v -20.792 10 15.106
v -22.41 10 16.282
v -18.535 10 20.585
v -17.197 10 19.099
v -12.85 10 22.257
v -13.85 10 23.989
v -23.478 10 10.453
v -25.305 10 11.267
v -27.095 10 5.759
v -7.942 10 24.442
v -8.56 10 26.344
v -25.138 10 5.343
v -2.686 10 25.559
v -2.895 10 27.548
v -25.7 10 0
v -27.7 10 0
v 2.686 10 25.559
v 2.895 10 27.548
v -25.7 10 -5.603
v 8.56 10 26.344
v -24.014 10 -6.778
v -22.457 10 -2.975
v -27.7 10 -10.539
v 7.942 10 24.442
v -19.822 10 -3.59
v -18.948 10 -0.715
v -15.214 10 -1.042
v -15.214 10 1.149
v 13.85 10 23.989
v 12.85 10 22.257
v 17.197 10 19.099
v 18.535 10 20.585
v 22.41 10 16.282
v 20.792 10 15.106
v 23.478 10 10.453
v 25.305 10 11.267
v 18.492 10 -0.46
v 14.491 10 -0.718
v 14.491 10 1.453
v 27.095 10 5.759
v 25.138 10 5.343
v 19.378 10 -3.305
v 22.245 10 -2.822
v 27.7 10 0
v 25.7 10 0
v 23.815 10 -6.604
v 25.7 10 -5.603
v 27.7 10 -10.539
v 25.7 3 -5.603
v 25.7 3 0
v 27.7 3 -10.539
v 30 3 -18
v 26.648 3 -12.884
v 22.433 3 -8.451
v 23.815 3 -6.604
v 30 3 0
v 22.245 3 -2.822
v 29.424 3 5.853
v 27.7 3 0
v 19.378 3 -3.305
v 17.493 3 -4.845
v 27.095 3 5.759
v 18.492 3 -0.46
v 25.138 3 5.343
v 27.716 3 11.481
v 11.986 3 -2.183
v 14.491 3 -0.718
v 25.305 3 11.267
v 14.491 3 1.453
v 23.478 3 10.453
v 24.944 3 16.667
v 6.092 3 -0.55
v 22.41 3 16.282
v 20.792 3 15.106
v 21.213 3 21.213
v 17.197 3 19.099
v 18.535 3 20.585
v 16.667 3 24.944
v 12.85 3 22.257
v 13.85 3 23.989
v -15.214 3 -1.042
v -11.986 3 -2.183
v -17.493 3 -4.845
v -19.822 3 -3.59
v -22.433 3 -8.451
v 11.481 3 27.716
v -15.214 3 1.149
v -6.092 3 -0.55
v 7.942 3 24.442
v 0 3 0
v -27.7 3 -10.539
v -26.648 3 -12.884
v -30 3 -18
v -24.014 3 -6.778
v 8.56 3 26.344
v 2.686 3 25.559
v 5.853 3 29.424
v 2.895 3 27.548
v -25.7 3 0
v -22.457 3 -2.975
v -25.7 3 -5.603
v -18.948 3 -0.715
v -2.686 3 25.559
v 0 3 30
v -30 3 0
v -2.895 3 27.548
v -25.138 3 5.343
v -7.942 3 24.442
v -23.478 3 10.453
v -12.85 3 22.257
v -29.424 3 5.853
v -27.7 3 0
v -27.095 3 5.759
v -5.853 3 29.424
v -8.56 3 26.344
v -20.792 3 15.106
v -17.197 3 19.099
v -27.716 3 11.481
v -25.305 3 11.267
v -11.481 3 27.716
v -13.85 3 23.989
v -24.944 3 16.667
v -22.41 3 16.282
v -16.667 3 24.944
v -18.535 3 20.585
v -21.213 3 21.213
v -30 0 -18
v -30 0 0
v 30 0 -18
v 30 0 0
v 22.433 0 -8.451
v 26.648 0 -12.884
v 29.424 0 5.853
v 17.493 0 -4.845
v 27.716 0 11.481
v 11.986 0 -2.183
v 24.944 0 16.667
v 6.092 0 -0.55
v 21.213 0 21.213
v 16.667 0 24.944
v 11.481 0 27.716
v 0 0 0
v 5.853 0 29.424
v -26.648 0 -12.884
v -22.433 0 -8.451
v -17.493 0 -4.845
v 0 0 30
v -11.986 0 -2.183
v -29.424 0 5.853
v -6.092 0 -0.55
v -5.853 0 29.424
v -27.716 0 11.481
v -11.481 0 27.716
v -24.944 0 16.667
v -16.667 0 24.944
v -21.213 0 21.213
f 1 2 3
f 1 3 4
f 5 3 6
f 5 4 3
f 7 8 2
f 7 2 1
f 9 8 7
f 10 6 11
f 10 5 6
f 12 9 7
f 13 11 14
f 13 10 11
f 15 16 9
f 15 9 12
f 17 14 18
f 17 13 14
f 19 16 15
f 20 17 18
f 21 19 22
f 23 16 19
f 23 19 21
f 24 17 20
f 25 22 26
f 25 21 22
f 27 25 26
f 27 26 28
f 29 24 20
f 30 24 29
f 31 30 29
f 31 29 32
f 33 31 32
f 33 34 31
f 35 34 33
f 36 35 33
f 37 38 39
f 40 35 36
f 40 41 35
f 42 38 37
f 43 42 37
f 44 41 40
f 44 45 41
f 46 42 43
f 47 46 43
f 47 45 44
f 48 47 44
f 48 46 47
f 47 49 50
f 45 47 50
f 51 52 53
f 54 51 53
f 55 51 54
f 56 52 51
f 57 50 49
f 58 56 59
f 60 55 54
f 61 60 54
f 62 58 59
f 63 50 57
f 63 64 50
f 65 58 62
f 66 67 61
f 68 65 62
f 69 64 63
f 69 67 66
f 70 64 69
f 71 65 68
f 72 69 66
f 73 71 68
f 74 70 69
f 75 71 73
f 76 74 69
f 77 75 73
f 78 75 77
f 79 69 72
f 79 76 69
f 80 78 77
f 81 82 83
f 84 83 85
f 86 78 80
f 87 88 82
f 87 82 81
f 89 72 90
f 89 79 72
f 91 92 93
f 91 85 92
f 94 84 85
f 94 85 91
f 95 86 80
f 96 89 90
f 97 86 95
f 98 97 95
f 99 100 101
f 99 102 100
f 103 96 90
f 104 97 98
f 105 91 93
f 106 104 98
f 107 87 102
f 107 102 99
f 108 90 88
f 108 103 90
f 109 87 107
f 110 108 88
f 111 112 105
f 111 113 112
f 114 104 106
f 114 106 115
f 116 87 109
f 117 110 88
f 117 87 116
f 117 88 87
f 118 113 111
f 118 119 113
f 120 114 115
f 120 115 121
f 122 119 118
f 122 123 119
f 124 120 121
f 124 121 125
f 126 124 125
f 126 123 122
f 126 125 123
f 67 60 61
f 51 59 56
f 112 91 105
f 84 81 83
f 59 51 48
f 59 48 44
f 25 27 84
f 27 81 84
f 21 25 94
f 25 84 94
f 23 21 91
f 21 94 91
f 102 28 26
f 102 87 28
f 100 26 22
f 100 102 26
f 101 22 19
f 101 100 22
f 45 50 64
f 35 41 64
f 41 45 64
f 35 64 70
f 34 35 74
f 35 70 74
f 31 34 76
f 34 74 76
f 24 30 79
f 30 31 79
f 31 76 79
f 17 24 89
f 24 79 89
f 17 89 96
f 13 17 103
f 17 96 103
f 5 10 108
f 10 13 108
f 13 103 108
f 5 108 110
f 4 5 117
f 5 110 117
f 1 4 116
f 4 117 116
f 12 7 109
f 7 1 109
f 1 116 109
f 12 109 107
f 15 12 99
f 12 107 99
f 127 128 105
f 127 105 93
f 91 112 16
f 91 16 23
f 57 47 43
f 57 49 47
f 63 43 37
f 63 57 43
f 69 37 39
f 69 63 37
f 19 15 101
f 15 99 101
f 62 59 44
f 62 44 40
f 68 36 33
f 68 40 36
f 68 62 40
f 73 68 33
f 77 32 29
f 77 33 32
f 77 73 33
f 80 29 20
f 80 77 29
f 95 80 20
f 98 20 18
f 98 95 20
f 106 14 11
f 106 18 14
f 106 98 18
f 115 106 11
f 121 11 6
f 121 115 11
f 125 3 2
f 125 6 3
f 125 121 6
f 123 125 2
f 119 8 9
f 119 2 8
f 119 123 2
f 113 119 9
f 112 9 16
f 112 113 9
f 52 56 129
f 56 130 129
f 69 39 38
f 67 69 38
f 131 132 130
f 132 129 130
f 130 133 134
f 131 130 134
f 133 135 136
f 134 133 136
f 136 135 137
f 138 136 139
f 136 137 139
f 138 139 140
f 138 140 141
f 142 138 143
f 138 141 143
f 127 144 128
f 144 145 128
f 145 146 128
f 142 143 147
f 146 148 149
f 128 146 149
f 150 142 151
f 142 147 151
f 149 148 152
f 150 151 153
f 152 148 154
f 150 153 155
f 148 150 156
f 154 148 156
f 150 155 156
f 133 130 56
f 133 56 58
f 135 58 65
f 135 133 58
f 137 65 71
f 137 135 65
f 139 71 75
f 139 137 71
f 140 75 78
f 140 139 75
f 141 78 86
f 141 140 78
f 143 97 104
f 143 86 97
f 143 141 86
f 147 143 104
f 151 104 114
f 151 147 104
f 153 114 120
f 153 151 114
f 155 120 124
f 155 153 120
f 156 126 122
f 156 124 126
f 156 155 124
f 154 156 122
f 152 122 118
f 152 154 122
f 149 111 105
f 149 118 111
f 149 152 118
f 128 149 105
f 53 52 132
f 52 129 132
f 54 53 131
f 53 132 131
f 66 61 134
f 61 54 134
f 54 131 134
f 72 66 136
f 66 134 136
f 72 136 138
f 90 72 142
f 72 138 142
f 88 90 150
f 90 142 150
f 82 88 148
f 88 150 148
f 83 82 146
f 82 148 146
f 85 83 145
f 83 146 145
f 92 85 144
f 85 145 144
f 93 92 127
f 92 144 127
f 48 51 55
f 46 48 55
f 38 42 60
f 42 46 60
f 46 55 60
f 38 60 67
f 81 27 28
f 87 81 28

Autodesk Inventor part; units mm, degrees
ref_plane "YZ Plane" through (0, 0, 0) normal (1, 0, 0) x (0, 1, 0)
ref_plane "XZ Plane" through (0, 0, 0) normal (0, 1, 0) x (-1, 0, 0)
ref_plane "XY Plane" through (0, 0, 0) normal (0, 0, 1) x (1, 0, 0)
sketch "Sketch1" plane through (0, 0, 0) normal (0, 1, 0) x (-1, 0, 0)
  arc A0 (30, 0) -> (-30, 0) centre (0, 0) ccw
  line L0 (30, 0) -> (30, -18)
  line L1 (-30, 0) -> (-30, -18)
  arc A1 (30, -18) -> (-30, -18) centre (0, -34) ccw
  dimension "d0" = 60
  dimension "d1" = 34
  dimension "d4" = 18
extrude "Extrusion1" add sketch "Sketch1" along normal blind 3
sketch "Sketch2" plane through (0, 3, 0) normal (0, 1, 0) x (1, 0, 0)
  arc A0 (-30, 0) -> (30, 0) centre (0, 0) ccw projected
  arc A1 (-30, 18) -> (30, 18) centre (0, 34) ccw projected
  line L0 (-30, 18) -> (-30, 0) projected
  line L1 (30, 0) -> (30, 18) projected
  arc A2 (-27.7, 0) -> (27.7, 0) centre (0, 0) ccw
  line L2 (-27.7, 0) -> (-27.7, 10.5394)
  arc A3 (-27.7, 10.5394) -> (27.7, 10.5394) centre (0, 34) ccw
  line L3 (27.7, 10.5394) -> (27.7, 0)
  arc A4 (-25.7, 0) -> (25.7, 0) centre (0, 0) ccw
  line L4 (-25.7, 0) -> (-25.7, 5.6028)
  arc A5 (-25.7, 5.6028) -> (25.7, 5.6028) centre (0, 34) ccw
  line L5 (25.7, 5.6028) -> (25.7, 0)
  dimension "d5" = 2.3
  dimension "d6" = 2
extrude "Extrusion2" add sketch "Sketch2" along normal blind 7 contours L2 A3 L3 A2
sketch "Sketch3" plane through (0, 10, 0) normal (0, 1, 0) x (1, 0, 0)
  line L0 (-15.2137, -8.6006) -> (14.4909, -8.6006)
  line L1 (14.4909, -8.6006) -> (14.4909, 18.2853)
  line L2 (14.4909, 18.2853) -> (-15.2137, 18.2853)
  line L3 (-15.2137, 18.2853) -> (-15.2137, -8.6006)
  point P0 (0, 0)
extrude "Extrusion3" cut sketch "Sketch3" against normal blind 7
properties part number "Tapa general_3DPrint"
